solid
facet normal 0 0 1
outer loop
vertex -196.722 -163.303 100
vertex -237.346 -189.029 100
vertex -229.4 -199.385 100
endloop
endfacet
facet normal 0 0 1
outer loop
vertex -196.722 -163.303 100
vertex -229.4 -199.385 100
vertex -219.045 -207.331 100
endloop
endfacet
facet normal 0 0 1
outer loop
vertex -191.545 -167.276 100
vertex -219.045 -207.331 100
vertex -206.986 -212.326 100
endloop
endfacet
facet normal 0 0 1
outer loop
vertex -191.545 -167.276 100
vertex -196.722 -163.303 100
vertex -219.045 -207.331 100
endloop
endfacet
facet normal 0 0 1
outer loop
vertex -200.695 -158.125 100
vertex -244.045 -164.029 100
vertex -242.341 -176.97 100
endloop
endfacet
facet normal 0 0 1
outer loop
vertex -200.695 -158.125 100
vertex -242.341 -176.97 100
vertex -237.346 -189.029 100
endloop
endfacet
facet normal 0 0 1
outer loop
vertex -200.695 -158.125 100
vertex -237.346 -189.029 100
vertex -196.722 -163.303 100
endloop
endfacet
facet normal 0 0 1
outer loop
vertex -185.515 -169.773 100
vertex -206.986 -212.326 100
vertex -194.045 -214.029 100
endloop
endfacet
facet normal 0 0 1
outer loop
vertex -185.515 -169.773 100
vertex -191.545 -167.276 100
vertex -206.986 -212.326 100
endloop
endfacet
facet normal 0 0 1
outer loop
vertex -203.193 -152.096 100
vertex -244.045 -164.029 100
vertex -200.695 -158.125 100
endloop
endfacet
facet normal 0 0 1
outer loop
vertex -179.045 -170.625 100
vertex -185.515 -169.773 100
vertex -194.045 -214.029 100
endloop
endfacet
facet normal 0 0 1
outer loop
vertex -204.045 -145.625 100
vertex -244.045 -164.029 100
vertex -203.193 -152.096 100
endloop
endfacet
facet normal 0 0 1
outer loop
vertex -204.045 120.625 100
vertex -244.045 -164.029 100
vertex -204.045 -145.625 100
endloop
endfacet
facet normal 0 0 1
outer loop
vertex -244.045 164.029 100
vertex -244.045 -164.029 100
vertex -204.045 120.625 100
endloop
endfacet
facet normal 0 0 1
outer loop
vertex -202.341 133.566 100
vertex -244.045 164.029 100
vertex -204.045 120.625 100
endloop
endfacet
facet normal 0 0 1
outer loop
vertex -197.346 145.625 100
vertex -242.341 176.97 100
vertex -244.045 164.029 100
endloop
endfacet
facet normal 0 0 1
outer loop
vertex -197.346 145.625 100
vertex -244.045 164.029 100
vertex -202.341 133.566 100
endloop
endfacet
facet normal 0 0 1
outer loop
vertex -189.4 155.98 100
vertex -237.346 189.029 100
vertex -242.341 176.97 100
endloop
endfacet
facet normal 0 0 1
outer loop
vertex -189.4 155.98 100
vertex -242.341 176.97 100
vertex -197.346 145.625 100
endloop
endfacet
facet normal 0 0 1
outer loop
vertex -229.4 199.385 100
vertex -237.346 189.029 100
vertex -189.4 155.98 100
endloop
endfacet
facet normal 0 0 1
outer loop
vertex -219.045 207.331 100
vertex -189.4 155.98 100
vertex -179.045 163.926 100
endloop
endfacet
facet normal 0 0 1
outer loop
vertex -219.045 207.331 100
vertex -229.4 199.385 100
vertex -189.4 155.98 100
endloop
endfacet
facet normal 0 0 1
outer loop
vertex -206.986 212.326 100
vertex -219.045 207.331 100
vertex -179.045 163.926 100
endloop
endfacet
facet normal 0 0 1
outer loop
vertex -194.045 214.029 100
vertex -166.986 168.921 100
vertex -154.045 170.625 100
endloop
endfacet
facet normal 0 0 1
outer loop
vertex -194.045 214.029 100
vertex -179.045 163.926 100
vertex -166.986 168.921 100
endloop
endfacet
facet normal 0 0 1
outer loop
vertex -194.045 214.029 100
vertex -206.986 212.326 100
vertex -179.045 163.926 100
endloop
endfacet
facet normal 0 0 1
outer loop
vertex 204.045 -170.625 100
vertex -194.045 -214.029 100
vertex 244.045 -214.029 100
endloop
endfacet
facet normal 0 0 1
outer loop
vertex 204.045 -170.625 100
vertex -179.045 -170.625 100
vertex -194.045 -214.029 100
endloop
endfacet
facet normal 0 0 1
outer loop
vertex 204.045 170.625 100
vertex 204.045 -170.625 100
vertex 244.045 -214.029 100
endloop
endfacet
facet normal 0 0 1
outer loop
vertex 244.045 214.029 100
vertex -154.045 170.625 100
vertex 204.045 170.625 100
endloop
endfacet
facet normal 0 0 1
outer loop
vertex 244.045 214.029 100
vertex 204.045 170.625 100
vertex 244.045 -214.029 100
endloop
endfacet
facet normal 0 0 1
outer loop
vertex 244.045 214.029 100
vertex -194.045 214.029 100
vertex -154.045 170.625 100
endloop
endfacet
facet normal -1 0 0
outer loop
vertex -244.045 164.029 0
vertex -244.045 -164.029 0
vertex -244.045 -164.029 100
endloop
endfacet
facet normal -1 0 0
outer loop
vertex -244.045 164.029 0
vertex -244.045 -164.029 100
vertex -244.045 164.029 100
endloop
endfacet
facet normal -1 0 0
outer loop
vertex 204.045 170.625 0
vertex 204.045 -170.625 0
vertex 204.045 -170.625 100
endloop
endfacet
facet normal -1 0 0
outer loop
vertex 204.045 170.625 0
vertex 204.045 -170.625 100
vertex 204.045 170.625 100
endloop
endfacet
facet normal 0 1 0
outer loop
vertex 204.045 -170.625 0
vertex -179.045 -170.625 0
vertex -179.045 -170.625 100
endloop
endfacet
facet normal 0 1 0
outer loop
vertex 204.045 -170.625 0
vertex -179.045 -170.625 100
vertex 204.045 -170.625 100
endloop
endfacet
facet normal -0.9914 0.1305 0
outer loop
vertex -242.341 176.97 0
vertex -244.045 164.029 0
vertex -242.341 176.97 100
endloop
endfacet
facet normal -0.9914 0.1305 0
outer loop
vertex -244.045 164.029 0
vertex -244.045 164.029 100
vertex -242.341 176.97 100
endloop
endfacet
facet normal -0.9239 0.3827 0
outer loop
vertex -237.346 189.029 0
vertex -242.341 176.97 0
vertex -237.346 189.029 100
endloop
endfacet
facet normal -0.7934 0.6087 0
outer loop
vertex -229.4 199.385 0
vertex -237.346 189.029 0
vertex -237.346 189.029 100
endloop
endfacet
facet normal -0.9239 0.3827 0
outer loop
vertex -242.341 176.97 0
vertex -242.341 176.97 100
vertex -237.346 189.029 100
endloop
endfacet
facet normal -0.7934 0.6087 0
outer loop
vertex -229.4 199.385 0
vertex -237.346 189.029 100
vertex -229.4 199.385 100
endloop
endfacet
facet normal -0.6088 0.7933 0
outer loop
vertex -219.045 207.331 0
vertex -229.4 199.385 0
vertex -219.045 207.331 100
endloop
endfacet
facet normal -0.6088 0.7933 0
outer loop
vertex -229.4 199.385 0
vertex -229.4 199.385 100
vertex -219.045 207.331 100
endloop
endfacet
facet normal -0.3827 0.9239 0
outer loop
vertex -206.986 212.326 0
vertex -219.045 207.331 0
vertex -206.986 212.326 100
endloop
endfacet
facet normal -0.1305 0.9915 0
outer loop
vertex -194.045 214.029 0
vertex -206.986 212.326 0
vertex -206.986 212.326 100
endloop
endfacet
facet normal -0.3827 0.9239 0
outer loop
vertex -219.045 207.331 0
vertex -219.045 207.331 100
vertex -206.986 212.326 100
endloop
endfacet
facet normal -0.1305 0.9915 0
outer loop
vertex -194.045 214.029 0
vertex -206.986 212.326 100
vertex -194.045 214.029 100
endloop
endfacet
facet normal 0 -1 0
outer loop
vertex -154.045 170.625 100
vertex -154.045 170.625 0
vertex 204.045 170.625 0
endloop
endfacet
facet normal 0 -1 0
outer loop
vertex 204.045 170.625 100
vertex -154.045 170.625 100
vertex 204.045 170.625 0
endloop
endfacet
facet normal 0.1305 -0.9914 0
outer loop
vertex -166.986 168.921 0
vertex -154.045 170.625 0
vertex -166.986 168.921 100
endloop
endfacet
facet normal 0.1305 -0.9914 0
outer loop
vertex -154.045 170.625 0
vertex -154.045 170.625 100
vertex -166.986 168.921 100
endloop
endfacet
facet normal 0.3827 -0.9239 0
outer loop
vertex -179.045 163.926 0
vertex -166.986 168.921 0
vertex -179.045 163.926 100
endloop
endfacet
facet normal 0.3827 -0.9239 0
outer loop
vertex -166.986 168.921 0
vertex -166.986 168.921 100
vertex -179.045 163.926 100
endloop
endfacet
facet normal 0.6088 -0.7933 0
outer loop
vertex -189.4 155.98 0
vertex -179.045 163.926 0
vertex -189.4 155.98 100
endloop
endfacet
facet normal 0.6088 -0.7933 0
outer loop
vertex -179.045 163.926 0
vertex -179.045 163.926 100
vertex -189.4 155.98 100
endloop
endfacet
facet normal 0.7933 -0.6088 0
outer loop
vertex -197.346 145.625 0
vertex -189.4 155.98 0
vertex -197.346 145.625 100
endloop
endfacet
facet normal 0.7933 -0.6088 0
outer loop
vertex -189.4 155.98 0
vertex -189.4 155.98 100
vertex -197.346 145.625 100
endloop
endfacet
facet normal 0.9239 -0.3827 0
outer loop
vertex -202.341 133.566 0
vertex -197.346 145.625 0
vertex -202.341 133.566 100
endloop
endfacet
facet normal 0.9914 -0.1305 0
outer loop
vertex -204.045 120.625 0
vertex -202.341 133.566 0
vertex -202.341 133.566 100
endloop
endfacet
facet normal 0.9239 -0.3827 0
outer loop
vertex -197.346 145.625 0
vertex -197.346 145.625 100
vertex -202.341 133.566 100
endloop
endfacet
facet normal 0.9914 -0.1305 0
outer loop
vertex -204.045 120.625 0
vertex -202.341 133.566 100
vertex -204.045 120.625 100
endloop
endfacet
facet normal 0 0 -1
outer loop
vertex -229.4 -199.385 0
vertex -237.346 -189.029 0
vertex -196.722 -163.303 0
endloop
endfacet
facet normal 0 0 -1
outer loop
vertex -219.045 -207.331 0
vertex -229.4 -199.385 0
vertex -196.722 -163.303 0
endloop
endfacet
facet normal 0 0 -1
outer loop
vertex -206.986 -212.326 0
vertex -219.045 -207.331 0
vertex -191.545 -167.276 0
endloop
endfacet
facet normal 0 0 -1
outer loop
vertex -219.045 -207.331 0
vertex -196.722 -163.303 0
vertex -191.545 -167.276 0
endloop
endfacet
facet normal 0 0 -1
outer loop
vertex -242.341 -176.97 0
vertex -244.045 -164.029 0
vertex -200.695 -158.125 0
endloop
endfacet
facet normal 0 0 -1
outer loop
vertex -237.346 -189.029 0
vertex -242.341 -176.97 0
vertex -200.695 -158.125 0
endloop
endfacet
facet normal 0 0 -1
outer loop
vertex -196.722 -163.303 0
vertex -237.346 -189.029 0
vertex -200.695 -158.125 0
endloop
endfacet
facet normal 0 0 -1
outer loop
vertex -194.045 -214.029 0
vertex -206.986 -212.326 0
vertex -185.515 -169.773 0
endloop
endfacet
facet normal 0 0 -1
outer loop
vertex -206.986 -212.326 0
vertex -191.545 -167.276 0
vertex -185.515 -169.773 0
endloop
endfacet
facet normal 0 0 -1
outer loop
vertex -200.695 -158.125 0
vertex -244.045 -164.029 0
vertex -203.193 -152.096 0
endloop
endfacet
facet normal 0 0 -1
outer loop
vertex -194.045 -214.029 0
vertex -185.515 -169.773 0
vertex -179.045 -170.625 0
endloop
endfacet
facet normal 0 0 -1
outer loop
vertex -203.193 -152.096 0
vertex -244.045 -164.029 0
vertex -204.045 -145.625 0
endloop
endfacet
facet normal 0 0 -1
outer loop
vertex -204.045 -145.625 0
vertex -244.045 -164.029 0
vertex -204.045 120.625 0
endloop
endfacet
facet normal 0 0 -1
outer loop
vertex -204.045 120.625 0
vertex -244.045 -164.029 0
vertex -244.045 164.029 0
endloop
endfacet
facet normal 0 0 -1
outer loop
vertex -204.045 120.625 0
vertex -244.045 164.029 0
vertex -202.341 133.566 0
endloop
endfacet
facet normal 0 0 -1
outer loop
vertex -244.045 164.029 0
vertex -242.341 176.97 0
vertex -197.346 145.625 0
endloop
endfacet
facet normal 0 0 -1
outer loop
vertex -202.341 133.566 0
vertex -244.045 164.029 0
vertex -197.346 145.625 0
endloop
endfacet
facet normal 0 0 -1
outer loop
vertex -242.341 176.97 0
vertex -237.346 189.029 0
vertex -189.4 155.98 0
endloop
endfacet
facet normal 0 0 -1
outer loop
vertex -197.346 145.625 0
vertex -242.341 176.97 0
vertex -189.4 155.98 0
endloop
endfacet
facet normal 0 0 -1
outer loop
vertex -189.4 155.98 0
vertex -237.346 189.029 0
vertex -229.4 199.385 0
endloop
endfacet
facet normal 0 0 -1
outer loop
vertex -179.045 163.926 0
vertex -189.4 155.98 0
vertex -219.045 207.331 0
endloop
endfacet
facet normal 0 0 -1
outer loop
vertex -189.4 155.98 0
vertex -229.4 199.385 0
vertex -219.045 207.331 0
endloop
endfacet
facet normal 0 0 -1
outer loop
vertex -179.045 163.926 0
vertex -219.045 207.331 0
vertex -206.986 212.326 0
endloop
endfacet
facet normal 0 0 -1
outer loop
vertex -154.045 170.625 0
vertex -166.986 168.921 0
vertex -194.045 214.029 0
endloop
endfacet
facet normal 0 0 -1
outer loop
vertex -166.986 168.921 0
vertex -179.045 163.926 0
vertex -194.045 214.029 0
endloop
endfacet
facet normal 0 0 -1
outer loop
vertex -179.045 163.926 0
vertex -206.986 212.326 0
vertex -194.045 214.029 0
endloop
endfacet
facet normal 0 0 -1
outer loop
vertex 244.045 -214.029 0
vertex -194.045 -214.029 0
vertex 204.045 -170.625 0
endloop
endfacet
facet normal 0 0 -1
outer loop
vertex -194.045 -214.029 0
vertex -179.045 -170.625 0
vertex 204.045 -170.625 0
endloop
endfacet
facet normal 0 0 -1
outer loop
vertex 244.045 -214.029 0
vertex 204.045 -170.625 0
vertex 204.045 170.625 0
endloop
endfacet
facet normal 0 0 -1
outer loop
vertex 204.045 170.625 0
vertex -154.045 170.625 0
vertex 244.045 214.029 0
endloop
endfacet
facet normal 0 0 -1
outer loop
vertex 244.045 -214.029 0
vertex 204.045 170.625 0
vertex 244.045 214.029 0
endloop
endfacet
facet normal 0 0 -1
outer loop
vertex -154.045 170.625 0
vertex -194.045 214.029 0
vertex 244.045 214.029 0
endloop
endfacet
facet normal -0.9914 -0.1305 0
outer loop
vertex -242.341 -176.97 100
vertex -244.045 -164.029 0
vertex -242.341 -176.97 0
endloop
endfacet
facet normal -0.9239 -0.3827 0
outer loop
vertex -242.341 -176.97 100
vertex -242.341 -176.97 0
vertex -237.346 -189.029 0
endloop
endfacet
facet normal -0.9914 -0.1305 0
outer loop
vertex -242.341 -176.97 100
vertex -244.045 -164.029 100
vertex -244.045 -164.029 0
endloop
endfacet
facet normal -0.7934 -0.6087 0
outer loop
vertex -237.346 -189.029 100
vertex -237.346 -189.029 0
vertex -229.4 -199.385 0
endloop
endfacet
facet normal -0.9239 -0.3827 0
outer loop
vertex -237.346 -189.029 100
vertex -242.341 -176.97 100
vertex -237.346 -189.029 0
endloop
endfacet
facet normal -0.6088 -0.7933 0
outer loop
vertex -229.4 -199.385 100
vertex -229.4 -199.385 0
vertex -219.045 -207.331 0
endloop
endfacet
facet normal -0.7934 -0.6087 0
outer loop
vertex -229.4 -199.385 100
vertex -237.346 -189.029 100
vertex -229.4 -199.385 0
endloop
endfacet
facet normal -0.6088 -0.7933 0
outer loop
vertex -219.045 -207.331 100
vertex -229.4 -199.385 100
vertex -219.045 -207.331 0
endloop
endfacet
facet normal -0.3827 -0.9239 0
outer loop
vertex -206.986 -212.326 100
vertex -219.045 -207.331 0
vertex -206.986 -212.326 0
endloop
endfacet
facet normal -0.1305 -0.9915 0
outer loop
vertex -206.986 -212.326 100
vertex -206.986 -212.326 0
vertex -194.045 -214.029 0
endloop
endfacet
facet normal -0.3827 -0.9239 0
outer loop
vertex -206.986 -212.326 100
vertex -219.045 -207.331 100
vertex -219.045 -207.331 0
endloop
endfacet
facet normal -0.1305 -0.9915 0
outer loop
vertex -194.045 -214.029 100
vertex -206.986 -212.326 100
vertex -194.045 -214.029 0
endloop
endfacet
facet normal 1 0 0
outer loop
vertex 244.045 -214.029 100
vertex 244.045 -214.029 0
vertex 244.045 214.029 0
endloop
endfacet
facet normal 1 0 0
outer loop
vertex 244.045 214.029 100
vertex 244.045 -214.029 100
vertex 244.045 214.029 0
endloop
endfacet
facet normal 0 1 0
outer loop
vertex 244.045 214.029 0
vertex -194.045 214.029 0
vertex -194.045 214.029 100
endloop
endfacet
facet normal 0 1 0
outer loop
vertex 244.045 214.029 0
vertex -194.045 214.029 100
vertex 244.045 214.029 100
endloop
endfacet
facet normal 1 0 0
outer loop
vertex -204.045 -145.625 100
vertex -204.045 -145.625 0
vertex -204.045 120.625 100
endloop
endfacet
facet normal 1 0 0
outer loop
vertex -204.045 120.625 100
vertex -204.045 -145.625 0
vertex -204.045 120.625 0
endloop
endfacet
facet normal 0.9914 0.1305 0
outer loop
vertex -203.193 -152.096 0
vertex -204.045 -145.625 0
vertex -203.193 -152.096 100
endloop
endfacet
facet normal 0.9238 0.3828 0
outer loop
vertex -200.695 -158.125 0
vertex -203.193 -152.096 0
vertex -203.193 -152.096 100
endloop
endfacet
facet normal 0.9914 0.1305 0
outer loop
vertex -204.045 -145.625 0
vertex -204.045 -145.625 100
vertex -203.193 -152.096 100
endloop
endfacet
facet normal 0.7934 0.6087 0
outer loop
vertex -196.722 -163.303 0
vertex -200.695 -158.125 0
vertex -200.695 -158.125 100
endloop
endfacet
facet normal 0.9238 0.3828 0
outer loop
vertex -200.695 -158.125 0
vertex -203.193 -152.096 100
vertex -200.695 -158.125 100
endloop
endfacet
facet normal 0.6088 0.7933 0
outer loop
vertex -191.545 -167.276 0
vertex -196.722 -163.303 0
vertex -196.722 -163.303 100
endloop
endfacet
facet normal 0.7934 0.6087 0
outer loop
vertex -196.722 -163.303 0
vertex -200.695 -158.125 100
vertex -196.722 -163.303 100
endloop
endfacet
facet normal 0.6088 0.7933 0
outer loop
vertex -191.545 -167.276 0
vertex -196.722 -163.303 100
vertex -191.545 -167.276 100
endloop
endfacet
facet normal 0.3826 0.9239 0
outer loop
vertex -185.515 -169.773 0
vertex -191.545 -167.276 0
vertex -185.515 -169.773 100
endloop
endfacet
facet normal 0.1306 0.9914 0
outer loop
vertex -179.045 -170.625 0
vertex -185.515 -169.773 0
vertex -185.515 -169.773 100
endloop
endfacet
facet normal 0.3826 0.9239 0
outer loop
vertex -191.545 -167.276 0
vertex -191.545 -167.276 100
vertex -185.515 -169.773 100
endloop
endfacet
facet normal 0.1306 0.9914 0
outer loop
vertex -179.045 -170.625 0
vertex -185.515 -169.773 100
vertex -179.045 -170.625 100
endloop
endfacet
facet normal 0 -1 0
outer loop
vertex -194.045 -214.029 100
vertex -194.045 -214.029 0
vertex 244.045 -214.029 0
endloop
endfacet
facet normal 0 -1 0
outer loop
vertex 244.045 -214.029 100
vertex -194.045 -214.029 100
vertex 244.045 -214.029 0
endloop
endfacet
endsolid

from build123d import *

# Parameters (mm, degrees)
F0_W     = 488.089332
F0_H     = 428.058626
F0_W_2   = 408.089332
F0_H_2   = 341.250144
F1_DEPTH = 100
F2_R     = 50
F3_R     = 25


with BuildPart() as f1:
    # F0 (on Top) → F1 (new body)
    with BuildSketch(Plane.XY):
        Rectangle(F0_W, F0_H)
        Rectangle(F0_W_2, F0_H_2, mode=Mode.SUBTRACT)
    extrude(amount=F1_DEPTH)

    # F2
    f2_edges = [f1.edges().sort_by_distance(p)[0] for p in [
        (-244.044666, 214.029313, 50),
        (-244.044666, -214.029313, 50),
        (-204.044666, 170.625072, 50),
    ]]
    fillet(f2_edges, radius=F2_R)

    # F3
    f3_edges = [f1.edges().sort_by_distance(p)[0] for p in [
        (-204.044666, -170.625072, 50),
    ]]
    fillet(f3_edges, radius=F3_R)


solid = f1.part
